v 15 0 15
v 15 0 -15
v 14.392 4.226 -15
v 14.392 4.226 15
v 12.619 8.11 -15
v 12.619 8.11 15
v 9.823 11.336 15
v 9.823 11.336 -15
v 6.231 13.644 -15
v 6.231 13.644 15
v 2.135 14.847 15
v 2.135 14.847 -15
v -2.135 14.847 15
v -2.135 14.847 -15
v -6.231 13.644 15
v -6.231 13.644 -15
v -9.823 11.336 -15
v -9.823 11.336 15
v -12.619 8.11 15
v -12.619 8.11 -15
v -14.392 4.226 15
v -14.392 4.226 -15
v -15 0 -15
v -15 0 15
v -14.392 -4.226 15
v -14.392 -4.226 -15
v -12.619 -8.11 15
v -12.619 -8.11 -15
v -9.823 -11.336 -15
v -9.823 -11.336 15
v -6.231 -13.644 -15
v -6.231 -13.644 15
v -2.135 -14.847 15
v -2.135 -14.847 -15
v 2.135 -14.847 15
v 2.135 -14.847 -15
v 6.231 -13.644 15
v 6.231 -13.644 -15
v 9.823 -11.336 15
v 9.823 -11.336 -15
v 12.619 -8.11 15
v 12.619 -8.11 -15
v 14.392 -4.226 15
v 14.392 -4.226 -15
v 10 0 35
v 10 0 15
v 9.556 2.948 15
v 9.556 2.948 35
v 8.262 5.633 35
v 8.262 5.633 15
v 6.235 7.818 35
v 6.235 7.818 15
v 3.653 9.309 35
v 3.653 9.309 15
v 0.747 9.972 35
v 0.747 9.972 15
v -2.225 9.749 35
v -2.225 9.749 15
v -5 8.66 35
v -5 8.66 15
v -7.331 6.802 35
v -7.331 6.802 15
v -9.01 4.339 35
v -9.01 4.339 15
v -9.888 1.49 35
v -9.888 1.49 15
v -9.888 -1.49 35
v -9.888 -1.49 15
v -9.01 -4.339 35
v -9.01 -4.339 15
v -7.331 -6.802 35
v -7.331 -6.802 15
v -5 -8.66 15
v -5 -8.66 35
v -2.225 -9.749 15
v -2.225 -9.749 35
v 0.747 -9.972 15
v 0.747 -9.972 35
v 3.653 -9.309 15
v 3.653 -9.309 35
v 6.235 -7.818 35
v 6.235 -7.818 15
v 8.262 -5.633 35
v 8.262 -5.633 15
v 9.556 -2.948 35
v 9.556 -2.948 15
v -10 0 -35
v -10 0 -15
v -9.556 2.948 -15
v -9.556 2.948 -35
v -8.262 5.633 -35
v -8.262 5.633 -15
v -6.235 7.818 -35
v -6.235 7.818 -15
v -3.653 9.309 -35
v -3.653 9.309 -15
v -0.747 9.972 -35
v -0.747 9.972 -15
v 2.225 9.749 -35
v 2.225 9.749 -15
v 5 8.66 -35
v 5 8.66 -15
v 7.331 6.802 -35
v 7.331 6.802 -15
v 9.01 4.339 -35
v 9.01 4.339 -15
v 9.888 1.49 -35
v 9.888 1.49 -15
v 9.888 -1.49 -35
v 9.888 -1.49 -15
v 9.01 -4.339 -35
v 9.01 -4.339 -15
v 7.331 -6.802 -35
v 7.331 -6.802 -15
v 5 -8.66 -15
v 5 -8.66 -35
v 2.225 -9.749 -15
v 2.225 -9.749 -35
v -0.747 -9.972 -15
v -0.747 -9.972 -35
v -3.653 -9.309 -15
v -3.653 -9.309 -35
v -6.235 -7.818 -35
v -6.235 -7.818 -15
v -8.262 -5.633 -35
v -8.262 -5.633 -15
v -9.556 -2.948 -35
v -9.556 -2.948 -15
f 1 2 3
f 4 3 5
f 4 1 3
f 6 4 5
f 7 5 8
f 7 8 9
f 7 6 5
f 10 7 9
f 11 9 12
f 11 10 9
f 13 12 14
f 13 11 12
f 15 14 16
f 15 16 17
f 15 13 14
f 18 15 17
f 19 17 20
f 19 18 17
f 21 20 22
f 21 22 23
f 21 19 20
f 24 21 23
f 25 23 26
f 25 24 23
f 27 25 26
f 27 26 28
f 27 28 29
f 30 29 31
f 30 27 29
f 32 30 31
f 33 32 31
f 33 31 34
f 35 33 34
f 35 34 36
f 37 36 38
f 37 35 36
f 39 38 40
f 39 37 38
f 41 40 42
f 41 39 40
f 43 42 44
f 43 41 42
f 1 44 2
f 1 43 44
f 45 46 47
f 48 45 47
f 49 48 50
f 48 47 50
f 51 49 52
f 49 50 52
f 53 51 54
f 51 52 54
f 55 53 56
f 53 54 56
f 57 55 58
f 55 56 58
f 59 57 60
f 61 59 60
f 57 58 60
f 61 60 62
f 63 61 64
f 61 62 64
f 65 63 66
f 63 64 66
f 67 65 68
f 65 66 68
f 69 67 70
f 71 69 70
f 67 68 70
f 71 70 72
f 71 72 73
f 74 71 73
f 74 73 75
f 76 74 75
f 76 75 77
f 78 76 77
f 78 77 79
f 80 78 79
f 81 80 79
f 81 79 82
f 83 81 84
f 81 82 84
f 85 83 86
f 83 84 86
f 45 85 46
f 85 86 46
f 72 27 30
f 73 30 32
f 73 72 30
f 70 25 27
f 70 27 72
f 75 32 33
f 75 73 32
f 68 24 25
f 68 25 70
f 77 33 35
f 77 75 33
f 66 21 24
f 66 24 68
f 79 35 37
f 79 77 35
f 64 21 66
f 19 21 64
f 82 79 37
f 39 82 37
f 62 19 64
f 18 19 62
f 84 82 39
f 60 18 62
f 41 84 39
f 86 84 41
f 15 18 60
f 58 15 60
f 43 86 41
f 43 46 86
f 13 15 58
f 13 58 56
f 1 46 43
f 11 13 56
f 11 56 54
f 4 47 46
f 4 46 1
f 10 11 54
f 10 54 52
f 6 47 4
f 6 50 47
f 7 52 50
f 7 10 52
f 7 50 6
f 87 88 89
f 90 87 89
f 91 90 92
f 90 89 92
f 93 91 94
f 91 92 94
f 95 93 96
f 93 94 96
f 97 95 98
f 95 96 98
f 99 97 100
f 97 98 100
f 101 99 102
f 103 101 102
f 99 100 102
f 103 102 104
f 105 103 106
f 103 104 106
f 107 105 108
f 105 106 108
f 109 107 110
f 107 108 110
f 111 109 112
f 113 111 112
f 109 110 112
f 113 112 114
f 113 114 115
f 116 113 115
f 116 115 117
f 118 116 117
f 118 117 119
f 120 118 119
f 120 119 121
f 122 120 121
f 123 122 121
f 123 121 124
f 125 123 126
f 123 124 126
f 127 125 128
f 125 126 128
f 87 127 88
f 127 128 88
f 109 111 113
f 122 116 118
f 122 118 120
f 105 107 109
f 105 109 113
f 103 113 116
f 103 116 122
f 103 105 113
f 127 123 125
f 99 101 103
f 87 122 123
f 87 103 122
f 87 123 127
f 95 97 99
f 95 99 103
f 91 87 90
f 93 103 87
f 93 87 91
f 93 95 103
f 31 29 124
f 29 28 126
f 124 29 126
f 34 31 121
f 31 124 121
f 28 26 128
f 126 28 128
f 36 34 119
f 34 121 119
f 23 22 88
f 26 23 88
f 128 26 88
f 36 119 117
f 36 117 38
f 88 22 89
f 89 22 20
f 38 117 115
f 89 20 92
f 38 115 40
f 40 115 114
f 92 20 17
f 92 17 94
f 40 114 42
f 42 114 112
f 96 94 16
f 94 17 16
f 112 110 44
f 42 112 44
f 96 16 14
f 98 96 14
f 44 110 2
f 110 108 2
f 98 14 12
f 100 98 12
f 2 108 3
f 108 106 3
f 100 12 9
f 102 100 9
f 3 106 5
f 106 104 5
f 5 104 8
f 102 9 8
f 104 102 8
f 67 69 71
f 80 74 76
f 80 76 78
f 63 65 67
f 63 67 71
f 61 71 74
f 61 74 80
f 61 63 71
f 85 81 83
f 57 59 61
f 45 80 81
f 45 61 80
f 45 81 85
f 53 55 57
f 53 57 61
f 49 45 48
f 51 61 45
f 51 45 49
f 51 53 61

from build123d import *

# Parameters (mm, degrees)
SKETCH1_R           = 15
BOSS_EXTRUDE1_DEPTH = 15
SKETCH2_R           = 10
BOSS_EXTRUDE2_DEPTH = 20
BOSS_EXTRUDE3_START = 20
SKETCH3_R           = 10
BOSS_EXTRUDE3_DEPTH = 20


with BuildPart() as part:
    # Sketch1 → Boss-Extrude1 (new, symmetric)
    with BuildSketch(Plane.XY):
        Circle(SKETCH1_R)
    extrude(amount=BOSS_EXTRUDE1_DEPTH, both=True)

    # Sketch2 → Boss-Extrude2 (add)
    with BuildSketch(Plane.XY.offset(15)):
        Circle(SKETCH2_R)
    extrude(amount=BOSS_EXTRUDE2_DEPTH)

    # Sketch3 → Boss-Extrude3 (add)
    with BuildSketch(Plane(origin=(0, 0, -15), x_dir=(-1, 0, 0), z_dir=(0, 0, -1)).offset(BOSS_EXTRUDE3_START)):
        Circle(SKETCH3_R)
    extrude(amount=-BOSS_EXTRUDE3_DEPTH)


solid = part.part
